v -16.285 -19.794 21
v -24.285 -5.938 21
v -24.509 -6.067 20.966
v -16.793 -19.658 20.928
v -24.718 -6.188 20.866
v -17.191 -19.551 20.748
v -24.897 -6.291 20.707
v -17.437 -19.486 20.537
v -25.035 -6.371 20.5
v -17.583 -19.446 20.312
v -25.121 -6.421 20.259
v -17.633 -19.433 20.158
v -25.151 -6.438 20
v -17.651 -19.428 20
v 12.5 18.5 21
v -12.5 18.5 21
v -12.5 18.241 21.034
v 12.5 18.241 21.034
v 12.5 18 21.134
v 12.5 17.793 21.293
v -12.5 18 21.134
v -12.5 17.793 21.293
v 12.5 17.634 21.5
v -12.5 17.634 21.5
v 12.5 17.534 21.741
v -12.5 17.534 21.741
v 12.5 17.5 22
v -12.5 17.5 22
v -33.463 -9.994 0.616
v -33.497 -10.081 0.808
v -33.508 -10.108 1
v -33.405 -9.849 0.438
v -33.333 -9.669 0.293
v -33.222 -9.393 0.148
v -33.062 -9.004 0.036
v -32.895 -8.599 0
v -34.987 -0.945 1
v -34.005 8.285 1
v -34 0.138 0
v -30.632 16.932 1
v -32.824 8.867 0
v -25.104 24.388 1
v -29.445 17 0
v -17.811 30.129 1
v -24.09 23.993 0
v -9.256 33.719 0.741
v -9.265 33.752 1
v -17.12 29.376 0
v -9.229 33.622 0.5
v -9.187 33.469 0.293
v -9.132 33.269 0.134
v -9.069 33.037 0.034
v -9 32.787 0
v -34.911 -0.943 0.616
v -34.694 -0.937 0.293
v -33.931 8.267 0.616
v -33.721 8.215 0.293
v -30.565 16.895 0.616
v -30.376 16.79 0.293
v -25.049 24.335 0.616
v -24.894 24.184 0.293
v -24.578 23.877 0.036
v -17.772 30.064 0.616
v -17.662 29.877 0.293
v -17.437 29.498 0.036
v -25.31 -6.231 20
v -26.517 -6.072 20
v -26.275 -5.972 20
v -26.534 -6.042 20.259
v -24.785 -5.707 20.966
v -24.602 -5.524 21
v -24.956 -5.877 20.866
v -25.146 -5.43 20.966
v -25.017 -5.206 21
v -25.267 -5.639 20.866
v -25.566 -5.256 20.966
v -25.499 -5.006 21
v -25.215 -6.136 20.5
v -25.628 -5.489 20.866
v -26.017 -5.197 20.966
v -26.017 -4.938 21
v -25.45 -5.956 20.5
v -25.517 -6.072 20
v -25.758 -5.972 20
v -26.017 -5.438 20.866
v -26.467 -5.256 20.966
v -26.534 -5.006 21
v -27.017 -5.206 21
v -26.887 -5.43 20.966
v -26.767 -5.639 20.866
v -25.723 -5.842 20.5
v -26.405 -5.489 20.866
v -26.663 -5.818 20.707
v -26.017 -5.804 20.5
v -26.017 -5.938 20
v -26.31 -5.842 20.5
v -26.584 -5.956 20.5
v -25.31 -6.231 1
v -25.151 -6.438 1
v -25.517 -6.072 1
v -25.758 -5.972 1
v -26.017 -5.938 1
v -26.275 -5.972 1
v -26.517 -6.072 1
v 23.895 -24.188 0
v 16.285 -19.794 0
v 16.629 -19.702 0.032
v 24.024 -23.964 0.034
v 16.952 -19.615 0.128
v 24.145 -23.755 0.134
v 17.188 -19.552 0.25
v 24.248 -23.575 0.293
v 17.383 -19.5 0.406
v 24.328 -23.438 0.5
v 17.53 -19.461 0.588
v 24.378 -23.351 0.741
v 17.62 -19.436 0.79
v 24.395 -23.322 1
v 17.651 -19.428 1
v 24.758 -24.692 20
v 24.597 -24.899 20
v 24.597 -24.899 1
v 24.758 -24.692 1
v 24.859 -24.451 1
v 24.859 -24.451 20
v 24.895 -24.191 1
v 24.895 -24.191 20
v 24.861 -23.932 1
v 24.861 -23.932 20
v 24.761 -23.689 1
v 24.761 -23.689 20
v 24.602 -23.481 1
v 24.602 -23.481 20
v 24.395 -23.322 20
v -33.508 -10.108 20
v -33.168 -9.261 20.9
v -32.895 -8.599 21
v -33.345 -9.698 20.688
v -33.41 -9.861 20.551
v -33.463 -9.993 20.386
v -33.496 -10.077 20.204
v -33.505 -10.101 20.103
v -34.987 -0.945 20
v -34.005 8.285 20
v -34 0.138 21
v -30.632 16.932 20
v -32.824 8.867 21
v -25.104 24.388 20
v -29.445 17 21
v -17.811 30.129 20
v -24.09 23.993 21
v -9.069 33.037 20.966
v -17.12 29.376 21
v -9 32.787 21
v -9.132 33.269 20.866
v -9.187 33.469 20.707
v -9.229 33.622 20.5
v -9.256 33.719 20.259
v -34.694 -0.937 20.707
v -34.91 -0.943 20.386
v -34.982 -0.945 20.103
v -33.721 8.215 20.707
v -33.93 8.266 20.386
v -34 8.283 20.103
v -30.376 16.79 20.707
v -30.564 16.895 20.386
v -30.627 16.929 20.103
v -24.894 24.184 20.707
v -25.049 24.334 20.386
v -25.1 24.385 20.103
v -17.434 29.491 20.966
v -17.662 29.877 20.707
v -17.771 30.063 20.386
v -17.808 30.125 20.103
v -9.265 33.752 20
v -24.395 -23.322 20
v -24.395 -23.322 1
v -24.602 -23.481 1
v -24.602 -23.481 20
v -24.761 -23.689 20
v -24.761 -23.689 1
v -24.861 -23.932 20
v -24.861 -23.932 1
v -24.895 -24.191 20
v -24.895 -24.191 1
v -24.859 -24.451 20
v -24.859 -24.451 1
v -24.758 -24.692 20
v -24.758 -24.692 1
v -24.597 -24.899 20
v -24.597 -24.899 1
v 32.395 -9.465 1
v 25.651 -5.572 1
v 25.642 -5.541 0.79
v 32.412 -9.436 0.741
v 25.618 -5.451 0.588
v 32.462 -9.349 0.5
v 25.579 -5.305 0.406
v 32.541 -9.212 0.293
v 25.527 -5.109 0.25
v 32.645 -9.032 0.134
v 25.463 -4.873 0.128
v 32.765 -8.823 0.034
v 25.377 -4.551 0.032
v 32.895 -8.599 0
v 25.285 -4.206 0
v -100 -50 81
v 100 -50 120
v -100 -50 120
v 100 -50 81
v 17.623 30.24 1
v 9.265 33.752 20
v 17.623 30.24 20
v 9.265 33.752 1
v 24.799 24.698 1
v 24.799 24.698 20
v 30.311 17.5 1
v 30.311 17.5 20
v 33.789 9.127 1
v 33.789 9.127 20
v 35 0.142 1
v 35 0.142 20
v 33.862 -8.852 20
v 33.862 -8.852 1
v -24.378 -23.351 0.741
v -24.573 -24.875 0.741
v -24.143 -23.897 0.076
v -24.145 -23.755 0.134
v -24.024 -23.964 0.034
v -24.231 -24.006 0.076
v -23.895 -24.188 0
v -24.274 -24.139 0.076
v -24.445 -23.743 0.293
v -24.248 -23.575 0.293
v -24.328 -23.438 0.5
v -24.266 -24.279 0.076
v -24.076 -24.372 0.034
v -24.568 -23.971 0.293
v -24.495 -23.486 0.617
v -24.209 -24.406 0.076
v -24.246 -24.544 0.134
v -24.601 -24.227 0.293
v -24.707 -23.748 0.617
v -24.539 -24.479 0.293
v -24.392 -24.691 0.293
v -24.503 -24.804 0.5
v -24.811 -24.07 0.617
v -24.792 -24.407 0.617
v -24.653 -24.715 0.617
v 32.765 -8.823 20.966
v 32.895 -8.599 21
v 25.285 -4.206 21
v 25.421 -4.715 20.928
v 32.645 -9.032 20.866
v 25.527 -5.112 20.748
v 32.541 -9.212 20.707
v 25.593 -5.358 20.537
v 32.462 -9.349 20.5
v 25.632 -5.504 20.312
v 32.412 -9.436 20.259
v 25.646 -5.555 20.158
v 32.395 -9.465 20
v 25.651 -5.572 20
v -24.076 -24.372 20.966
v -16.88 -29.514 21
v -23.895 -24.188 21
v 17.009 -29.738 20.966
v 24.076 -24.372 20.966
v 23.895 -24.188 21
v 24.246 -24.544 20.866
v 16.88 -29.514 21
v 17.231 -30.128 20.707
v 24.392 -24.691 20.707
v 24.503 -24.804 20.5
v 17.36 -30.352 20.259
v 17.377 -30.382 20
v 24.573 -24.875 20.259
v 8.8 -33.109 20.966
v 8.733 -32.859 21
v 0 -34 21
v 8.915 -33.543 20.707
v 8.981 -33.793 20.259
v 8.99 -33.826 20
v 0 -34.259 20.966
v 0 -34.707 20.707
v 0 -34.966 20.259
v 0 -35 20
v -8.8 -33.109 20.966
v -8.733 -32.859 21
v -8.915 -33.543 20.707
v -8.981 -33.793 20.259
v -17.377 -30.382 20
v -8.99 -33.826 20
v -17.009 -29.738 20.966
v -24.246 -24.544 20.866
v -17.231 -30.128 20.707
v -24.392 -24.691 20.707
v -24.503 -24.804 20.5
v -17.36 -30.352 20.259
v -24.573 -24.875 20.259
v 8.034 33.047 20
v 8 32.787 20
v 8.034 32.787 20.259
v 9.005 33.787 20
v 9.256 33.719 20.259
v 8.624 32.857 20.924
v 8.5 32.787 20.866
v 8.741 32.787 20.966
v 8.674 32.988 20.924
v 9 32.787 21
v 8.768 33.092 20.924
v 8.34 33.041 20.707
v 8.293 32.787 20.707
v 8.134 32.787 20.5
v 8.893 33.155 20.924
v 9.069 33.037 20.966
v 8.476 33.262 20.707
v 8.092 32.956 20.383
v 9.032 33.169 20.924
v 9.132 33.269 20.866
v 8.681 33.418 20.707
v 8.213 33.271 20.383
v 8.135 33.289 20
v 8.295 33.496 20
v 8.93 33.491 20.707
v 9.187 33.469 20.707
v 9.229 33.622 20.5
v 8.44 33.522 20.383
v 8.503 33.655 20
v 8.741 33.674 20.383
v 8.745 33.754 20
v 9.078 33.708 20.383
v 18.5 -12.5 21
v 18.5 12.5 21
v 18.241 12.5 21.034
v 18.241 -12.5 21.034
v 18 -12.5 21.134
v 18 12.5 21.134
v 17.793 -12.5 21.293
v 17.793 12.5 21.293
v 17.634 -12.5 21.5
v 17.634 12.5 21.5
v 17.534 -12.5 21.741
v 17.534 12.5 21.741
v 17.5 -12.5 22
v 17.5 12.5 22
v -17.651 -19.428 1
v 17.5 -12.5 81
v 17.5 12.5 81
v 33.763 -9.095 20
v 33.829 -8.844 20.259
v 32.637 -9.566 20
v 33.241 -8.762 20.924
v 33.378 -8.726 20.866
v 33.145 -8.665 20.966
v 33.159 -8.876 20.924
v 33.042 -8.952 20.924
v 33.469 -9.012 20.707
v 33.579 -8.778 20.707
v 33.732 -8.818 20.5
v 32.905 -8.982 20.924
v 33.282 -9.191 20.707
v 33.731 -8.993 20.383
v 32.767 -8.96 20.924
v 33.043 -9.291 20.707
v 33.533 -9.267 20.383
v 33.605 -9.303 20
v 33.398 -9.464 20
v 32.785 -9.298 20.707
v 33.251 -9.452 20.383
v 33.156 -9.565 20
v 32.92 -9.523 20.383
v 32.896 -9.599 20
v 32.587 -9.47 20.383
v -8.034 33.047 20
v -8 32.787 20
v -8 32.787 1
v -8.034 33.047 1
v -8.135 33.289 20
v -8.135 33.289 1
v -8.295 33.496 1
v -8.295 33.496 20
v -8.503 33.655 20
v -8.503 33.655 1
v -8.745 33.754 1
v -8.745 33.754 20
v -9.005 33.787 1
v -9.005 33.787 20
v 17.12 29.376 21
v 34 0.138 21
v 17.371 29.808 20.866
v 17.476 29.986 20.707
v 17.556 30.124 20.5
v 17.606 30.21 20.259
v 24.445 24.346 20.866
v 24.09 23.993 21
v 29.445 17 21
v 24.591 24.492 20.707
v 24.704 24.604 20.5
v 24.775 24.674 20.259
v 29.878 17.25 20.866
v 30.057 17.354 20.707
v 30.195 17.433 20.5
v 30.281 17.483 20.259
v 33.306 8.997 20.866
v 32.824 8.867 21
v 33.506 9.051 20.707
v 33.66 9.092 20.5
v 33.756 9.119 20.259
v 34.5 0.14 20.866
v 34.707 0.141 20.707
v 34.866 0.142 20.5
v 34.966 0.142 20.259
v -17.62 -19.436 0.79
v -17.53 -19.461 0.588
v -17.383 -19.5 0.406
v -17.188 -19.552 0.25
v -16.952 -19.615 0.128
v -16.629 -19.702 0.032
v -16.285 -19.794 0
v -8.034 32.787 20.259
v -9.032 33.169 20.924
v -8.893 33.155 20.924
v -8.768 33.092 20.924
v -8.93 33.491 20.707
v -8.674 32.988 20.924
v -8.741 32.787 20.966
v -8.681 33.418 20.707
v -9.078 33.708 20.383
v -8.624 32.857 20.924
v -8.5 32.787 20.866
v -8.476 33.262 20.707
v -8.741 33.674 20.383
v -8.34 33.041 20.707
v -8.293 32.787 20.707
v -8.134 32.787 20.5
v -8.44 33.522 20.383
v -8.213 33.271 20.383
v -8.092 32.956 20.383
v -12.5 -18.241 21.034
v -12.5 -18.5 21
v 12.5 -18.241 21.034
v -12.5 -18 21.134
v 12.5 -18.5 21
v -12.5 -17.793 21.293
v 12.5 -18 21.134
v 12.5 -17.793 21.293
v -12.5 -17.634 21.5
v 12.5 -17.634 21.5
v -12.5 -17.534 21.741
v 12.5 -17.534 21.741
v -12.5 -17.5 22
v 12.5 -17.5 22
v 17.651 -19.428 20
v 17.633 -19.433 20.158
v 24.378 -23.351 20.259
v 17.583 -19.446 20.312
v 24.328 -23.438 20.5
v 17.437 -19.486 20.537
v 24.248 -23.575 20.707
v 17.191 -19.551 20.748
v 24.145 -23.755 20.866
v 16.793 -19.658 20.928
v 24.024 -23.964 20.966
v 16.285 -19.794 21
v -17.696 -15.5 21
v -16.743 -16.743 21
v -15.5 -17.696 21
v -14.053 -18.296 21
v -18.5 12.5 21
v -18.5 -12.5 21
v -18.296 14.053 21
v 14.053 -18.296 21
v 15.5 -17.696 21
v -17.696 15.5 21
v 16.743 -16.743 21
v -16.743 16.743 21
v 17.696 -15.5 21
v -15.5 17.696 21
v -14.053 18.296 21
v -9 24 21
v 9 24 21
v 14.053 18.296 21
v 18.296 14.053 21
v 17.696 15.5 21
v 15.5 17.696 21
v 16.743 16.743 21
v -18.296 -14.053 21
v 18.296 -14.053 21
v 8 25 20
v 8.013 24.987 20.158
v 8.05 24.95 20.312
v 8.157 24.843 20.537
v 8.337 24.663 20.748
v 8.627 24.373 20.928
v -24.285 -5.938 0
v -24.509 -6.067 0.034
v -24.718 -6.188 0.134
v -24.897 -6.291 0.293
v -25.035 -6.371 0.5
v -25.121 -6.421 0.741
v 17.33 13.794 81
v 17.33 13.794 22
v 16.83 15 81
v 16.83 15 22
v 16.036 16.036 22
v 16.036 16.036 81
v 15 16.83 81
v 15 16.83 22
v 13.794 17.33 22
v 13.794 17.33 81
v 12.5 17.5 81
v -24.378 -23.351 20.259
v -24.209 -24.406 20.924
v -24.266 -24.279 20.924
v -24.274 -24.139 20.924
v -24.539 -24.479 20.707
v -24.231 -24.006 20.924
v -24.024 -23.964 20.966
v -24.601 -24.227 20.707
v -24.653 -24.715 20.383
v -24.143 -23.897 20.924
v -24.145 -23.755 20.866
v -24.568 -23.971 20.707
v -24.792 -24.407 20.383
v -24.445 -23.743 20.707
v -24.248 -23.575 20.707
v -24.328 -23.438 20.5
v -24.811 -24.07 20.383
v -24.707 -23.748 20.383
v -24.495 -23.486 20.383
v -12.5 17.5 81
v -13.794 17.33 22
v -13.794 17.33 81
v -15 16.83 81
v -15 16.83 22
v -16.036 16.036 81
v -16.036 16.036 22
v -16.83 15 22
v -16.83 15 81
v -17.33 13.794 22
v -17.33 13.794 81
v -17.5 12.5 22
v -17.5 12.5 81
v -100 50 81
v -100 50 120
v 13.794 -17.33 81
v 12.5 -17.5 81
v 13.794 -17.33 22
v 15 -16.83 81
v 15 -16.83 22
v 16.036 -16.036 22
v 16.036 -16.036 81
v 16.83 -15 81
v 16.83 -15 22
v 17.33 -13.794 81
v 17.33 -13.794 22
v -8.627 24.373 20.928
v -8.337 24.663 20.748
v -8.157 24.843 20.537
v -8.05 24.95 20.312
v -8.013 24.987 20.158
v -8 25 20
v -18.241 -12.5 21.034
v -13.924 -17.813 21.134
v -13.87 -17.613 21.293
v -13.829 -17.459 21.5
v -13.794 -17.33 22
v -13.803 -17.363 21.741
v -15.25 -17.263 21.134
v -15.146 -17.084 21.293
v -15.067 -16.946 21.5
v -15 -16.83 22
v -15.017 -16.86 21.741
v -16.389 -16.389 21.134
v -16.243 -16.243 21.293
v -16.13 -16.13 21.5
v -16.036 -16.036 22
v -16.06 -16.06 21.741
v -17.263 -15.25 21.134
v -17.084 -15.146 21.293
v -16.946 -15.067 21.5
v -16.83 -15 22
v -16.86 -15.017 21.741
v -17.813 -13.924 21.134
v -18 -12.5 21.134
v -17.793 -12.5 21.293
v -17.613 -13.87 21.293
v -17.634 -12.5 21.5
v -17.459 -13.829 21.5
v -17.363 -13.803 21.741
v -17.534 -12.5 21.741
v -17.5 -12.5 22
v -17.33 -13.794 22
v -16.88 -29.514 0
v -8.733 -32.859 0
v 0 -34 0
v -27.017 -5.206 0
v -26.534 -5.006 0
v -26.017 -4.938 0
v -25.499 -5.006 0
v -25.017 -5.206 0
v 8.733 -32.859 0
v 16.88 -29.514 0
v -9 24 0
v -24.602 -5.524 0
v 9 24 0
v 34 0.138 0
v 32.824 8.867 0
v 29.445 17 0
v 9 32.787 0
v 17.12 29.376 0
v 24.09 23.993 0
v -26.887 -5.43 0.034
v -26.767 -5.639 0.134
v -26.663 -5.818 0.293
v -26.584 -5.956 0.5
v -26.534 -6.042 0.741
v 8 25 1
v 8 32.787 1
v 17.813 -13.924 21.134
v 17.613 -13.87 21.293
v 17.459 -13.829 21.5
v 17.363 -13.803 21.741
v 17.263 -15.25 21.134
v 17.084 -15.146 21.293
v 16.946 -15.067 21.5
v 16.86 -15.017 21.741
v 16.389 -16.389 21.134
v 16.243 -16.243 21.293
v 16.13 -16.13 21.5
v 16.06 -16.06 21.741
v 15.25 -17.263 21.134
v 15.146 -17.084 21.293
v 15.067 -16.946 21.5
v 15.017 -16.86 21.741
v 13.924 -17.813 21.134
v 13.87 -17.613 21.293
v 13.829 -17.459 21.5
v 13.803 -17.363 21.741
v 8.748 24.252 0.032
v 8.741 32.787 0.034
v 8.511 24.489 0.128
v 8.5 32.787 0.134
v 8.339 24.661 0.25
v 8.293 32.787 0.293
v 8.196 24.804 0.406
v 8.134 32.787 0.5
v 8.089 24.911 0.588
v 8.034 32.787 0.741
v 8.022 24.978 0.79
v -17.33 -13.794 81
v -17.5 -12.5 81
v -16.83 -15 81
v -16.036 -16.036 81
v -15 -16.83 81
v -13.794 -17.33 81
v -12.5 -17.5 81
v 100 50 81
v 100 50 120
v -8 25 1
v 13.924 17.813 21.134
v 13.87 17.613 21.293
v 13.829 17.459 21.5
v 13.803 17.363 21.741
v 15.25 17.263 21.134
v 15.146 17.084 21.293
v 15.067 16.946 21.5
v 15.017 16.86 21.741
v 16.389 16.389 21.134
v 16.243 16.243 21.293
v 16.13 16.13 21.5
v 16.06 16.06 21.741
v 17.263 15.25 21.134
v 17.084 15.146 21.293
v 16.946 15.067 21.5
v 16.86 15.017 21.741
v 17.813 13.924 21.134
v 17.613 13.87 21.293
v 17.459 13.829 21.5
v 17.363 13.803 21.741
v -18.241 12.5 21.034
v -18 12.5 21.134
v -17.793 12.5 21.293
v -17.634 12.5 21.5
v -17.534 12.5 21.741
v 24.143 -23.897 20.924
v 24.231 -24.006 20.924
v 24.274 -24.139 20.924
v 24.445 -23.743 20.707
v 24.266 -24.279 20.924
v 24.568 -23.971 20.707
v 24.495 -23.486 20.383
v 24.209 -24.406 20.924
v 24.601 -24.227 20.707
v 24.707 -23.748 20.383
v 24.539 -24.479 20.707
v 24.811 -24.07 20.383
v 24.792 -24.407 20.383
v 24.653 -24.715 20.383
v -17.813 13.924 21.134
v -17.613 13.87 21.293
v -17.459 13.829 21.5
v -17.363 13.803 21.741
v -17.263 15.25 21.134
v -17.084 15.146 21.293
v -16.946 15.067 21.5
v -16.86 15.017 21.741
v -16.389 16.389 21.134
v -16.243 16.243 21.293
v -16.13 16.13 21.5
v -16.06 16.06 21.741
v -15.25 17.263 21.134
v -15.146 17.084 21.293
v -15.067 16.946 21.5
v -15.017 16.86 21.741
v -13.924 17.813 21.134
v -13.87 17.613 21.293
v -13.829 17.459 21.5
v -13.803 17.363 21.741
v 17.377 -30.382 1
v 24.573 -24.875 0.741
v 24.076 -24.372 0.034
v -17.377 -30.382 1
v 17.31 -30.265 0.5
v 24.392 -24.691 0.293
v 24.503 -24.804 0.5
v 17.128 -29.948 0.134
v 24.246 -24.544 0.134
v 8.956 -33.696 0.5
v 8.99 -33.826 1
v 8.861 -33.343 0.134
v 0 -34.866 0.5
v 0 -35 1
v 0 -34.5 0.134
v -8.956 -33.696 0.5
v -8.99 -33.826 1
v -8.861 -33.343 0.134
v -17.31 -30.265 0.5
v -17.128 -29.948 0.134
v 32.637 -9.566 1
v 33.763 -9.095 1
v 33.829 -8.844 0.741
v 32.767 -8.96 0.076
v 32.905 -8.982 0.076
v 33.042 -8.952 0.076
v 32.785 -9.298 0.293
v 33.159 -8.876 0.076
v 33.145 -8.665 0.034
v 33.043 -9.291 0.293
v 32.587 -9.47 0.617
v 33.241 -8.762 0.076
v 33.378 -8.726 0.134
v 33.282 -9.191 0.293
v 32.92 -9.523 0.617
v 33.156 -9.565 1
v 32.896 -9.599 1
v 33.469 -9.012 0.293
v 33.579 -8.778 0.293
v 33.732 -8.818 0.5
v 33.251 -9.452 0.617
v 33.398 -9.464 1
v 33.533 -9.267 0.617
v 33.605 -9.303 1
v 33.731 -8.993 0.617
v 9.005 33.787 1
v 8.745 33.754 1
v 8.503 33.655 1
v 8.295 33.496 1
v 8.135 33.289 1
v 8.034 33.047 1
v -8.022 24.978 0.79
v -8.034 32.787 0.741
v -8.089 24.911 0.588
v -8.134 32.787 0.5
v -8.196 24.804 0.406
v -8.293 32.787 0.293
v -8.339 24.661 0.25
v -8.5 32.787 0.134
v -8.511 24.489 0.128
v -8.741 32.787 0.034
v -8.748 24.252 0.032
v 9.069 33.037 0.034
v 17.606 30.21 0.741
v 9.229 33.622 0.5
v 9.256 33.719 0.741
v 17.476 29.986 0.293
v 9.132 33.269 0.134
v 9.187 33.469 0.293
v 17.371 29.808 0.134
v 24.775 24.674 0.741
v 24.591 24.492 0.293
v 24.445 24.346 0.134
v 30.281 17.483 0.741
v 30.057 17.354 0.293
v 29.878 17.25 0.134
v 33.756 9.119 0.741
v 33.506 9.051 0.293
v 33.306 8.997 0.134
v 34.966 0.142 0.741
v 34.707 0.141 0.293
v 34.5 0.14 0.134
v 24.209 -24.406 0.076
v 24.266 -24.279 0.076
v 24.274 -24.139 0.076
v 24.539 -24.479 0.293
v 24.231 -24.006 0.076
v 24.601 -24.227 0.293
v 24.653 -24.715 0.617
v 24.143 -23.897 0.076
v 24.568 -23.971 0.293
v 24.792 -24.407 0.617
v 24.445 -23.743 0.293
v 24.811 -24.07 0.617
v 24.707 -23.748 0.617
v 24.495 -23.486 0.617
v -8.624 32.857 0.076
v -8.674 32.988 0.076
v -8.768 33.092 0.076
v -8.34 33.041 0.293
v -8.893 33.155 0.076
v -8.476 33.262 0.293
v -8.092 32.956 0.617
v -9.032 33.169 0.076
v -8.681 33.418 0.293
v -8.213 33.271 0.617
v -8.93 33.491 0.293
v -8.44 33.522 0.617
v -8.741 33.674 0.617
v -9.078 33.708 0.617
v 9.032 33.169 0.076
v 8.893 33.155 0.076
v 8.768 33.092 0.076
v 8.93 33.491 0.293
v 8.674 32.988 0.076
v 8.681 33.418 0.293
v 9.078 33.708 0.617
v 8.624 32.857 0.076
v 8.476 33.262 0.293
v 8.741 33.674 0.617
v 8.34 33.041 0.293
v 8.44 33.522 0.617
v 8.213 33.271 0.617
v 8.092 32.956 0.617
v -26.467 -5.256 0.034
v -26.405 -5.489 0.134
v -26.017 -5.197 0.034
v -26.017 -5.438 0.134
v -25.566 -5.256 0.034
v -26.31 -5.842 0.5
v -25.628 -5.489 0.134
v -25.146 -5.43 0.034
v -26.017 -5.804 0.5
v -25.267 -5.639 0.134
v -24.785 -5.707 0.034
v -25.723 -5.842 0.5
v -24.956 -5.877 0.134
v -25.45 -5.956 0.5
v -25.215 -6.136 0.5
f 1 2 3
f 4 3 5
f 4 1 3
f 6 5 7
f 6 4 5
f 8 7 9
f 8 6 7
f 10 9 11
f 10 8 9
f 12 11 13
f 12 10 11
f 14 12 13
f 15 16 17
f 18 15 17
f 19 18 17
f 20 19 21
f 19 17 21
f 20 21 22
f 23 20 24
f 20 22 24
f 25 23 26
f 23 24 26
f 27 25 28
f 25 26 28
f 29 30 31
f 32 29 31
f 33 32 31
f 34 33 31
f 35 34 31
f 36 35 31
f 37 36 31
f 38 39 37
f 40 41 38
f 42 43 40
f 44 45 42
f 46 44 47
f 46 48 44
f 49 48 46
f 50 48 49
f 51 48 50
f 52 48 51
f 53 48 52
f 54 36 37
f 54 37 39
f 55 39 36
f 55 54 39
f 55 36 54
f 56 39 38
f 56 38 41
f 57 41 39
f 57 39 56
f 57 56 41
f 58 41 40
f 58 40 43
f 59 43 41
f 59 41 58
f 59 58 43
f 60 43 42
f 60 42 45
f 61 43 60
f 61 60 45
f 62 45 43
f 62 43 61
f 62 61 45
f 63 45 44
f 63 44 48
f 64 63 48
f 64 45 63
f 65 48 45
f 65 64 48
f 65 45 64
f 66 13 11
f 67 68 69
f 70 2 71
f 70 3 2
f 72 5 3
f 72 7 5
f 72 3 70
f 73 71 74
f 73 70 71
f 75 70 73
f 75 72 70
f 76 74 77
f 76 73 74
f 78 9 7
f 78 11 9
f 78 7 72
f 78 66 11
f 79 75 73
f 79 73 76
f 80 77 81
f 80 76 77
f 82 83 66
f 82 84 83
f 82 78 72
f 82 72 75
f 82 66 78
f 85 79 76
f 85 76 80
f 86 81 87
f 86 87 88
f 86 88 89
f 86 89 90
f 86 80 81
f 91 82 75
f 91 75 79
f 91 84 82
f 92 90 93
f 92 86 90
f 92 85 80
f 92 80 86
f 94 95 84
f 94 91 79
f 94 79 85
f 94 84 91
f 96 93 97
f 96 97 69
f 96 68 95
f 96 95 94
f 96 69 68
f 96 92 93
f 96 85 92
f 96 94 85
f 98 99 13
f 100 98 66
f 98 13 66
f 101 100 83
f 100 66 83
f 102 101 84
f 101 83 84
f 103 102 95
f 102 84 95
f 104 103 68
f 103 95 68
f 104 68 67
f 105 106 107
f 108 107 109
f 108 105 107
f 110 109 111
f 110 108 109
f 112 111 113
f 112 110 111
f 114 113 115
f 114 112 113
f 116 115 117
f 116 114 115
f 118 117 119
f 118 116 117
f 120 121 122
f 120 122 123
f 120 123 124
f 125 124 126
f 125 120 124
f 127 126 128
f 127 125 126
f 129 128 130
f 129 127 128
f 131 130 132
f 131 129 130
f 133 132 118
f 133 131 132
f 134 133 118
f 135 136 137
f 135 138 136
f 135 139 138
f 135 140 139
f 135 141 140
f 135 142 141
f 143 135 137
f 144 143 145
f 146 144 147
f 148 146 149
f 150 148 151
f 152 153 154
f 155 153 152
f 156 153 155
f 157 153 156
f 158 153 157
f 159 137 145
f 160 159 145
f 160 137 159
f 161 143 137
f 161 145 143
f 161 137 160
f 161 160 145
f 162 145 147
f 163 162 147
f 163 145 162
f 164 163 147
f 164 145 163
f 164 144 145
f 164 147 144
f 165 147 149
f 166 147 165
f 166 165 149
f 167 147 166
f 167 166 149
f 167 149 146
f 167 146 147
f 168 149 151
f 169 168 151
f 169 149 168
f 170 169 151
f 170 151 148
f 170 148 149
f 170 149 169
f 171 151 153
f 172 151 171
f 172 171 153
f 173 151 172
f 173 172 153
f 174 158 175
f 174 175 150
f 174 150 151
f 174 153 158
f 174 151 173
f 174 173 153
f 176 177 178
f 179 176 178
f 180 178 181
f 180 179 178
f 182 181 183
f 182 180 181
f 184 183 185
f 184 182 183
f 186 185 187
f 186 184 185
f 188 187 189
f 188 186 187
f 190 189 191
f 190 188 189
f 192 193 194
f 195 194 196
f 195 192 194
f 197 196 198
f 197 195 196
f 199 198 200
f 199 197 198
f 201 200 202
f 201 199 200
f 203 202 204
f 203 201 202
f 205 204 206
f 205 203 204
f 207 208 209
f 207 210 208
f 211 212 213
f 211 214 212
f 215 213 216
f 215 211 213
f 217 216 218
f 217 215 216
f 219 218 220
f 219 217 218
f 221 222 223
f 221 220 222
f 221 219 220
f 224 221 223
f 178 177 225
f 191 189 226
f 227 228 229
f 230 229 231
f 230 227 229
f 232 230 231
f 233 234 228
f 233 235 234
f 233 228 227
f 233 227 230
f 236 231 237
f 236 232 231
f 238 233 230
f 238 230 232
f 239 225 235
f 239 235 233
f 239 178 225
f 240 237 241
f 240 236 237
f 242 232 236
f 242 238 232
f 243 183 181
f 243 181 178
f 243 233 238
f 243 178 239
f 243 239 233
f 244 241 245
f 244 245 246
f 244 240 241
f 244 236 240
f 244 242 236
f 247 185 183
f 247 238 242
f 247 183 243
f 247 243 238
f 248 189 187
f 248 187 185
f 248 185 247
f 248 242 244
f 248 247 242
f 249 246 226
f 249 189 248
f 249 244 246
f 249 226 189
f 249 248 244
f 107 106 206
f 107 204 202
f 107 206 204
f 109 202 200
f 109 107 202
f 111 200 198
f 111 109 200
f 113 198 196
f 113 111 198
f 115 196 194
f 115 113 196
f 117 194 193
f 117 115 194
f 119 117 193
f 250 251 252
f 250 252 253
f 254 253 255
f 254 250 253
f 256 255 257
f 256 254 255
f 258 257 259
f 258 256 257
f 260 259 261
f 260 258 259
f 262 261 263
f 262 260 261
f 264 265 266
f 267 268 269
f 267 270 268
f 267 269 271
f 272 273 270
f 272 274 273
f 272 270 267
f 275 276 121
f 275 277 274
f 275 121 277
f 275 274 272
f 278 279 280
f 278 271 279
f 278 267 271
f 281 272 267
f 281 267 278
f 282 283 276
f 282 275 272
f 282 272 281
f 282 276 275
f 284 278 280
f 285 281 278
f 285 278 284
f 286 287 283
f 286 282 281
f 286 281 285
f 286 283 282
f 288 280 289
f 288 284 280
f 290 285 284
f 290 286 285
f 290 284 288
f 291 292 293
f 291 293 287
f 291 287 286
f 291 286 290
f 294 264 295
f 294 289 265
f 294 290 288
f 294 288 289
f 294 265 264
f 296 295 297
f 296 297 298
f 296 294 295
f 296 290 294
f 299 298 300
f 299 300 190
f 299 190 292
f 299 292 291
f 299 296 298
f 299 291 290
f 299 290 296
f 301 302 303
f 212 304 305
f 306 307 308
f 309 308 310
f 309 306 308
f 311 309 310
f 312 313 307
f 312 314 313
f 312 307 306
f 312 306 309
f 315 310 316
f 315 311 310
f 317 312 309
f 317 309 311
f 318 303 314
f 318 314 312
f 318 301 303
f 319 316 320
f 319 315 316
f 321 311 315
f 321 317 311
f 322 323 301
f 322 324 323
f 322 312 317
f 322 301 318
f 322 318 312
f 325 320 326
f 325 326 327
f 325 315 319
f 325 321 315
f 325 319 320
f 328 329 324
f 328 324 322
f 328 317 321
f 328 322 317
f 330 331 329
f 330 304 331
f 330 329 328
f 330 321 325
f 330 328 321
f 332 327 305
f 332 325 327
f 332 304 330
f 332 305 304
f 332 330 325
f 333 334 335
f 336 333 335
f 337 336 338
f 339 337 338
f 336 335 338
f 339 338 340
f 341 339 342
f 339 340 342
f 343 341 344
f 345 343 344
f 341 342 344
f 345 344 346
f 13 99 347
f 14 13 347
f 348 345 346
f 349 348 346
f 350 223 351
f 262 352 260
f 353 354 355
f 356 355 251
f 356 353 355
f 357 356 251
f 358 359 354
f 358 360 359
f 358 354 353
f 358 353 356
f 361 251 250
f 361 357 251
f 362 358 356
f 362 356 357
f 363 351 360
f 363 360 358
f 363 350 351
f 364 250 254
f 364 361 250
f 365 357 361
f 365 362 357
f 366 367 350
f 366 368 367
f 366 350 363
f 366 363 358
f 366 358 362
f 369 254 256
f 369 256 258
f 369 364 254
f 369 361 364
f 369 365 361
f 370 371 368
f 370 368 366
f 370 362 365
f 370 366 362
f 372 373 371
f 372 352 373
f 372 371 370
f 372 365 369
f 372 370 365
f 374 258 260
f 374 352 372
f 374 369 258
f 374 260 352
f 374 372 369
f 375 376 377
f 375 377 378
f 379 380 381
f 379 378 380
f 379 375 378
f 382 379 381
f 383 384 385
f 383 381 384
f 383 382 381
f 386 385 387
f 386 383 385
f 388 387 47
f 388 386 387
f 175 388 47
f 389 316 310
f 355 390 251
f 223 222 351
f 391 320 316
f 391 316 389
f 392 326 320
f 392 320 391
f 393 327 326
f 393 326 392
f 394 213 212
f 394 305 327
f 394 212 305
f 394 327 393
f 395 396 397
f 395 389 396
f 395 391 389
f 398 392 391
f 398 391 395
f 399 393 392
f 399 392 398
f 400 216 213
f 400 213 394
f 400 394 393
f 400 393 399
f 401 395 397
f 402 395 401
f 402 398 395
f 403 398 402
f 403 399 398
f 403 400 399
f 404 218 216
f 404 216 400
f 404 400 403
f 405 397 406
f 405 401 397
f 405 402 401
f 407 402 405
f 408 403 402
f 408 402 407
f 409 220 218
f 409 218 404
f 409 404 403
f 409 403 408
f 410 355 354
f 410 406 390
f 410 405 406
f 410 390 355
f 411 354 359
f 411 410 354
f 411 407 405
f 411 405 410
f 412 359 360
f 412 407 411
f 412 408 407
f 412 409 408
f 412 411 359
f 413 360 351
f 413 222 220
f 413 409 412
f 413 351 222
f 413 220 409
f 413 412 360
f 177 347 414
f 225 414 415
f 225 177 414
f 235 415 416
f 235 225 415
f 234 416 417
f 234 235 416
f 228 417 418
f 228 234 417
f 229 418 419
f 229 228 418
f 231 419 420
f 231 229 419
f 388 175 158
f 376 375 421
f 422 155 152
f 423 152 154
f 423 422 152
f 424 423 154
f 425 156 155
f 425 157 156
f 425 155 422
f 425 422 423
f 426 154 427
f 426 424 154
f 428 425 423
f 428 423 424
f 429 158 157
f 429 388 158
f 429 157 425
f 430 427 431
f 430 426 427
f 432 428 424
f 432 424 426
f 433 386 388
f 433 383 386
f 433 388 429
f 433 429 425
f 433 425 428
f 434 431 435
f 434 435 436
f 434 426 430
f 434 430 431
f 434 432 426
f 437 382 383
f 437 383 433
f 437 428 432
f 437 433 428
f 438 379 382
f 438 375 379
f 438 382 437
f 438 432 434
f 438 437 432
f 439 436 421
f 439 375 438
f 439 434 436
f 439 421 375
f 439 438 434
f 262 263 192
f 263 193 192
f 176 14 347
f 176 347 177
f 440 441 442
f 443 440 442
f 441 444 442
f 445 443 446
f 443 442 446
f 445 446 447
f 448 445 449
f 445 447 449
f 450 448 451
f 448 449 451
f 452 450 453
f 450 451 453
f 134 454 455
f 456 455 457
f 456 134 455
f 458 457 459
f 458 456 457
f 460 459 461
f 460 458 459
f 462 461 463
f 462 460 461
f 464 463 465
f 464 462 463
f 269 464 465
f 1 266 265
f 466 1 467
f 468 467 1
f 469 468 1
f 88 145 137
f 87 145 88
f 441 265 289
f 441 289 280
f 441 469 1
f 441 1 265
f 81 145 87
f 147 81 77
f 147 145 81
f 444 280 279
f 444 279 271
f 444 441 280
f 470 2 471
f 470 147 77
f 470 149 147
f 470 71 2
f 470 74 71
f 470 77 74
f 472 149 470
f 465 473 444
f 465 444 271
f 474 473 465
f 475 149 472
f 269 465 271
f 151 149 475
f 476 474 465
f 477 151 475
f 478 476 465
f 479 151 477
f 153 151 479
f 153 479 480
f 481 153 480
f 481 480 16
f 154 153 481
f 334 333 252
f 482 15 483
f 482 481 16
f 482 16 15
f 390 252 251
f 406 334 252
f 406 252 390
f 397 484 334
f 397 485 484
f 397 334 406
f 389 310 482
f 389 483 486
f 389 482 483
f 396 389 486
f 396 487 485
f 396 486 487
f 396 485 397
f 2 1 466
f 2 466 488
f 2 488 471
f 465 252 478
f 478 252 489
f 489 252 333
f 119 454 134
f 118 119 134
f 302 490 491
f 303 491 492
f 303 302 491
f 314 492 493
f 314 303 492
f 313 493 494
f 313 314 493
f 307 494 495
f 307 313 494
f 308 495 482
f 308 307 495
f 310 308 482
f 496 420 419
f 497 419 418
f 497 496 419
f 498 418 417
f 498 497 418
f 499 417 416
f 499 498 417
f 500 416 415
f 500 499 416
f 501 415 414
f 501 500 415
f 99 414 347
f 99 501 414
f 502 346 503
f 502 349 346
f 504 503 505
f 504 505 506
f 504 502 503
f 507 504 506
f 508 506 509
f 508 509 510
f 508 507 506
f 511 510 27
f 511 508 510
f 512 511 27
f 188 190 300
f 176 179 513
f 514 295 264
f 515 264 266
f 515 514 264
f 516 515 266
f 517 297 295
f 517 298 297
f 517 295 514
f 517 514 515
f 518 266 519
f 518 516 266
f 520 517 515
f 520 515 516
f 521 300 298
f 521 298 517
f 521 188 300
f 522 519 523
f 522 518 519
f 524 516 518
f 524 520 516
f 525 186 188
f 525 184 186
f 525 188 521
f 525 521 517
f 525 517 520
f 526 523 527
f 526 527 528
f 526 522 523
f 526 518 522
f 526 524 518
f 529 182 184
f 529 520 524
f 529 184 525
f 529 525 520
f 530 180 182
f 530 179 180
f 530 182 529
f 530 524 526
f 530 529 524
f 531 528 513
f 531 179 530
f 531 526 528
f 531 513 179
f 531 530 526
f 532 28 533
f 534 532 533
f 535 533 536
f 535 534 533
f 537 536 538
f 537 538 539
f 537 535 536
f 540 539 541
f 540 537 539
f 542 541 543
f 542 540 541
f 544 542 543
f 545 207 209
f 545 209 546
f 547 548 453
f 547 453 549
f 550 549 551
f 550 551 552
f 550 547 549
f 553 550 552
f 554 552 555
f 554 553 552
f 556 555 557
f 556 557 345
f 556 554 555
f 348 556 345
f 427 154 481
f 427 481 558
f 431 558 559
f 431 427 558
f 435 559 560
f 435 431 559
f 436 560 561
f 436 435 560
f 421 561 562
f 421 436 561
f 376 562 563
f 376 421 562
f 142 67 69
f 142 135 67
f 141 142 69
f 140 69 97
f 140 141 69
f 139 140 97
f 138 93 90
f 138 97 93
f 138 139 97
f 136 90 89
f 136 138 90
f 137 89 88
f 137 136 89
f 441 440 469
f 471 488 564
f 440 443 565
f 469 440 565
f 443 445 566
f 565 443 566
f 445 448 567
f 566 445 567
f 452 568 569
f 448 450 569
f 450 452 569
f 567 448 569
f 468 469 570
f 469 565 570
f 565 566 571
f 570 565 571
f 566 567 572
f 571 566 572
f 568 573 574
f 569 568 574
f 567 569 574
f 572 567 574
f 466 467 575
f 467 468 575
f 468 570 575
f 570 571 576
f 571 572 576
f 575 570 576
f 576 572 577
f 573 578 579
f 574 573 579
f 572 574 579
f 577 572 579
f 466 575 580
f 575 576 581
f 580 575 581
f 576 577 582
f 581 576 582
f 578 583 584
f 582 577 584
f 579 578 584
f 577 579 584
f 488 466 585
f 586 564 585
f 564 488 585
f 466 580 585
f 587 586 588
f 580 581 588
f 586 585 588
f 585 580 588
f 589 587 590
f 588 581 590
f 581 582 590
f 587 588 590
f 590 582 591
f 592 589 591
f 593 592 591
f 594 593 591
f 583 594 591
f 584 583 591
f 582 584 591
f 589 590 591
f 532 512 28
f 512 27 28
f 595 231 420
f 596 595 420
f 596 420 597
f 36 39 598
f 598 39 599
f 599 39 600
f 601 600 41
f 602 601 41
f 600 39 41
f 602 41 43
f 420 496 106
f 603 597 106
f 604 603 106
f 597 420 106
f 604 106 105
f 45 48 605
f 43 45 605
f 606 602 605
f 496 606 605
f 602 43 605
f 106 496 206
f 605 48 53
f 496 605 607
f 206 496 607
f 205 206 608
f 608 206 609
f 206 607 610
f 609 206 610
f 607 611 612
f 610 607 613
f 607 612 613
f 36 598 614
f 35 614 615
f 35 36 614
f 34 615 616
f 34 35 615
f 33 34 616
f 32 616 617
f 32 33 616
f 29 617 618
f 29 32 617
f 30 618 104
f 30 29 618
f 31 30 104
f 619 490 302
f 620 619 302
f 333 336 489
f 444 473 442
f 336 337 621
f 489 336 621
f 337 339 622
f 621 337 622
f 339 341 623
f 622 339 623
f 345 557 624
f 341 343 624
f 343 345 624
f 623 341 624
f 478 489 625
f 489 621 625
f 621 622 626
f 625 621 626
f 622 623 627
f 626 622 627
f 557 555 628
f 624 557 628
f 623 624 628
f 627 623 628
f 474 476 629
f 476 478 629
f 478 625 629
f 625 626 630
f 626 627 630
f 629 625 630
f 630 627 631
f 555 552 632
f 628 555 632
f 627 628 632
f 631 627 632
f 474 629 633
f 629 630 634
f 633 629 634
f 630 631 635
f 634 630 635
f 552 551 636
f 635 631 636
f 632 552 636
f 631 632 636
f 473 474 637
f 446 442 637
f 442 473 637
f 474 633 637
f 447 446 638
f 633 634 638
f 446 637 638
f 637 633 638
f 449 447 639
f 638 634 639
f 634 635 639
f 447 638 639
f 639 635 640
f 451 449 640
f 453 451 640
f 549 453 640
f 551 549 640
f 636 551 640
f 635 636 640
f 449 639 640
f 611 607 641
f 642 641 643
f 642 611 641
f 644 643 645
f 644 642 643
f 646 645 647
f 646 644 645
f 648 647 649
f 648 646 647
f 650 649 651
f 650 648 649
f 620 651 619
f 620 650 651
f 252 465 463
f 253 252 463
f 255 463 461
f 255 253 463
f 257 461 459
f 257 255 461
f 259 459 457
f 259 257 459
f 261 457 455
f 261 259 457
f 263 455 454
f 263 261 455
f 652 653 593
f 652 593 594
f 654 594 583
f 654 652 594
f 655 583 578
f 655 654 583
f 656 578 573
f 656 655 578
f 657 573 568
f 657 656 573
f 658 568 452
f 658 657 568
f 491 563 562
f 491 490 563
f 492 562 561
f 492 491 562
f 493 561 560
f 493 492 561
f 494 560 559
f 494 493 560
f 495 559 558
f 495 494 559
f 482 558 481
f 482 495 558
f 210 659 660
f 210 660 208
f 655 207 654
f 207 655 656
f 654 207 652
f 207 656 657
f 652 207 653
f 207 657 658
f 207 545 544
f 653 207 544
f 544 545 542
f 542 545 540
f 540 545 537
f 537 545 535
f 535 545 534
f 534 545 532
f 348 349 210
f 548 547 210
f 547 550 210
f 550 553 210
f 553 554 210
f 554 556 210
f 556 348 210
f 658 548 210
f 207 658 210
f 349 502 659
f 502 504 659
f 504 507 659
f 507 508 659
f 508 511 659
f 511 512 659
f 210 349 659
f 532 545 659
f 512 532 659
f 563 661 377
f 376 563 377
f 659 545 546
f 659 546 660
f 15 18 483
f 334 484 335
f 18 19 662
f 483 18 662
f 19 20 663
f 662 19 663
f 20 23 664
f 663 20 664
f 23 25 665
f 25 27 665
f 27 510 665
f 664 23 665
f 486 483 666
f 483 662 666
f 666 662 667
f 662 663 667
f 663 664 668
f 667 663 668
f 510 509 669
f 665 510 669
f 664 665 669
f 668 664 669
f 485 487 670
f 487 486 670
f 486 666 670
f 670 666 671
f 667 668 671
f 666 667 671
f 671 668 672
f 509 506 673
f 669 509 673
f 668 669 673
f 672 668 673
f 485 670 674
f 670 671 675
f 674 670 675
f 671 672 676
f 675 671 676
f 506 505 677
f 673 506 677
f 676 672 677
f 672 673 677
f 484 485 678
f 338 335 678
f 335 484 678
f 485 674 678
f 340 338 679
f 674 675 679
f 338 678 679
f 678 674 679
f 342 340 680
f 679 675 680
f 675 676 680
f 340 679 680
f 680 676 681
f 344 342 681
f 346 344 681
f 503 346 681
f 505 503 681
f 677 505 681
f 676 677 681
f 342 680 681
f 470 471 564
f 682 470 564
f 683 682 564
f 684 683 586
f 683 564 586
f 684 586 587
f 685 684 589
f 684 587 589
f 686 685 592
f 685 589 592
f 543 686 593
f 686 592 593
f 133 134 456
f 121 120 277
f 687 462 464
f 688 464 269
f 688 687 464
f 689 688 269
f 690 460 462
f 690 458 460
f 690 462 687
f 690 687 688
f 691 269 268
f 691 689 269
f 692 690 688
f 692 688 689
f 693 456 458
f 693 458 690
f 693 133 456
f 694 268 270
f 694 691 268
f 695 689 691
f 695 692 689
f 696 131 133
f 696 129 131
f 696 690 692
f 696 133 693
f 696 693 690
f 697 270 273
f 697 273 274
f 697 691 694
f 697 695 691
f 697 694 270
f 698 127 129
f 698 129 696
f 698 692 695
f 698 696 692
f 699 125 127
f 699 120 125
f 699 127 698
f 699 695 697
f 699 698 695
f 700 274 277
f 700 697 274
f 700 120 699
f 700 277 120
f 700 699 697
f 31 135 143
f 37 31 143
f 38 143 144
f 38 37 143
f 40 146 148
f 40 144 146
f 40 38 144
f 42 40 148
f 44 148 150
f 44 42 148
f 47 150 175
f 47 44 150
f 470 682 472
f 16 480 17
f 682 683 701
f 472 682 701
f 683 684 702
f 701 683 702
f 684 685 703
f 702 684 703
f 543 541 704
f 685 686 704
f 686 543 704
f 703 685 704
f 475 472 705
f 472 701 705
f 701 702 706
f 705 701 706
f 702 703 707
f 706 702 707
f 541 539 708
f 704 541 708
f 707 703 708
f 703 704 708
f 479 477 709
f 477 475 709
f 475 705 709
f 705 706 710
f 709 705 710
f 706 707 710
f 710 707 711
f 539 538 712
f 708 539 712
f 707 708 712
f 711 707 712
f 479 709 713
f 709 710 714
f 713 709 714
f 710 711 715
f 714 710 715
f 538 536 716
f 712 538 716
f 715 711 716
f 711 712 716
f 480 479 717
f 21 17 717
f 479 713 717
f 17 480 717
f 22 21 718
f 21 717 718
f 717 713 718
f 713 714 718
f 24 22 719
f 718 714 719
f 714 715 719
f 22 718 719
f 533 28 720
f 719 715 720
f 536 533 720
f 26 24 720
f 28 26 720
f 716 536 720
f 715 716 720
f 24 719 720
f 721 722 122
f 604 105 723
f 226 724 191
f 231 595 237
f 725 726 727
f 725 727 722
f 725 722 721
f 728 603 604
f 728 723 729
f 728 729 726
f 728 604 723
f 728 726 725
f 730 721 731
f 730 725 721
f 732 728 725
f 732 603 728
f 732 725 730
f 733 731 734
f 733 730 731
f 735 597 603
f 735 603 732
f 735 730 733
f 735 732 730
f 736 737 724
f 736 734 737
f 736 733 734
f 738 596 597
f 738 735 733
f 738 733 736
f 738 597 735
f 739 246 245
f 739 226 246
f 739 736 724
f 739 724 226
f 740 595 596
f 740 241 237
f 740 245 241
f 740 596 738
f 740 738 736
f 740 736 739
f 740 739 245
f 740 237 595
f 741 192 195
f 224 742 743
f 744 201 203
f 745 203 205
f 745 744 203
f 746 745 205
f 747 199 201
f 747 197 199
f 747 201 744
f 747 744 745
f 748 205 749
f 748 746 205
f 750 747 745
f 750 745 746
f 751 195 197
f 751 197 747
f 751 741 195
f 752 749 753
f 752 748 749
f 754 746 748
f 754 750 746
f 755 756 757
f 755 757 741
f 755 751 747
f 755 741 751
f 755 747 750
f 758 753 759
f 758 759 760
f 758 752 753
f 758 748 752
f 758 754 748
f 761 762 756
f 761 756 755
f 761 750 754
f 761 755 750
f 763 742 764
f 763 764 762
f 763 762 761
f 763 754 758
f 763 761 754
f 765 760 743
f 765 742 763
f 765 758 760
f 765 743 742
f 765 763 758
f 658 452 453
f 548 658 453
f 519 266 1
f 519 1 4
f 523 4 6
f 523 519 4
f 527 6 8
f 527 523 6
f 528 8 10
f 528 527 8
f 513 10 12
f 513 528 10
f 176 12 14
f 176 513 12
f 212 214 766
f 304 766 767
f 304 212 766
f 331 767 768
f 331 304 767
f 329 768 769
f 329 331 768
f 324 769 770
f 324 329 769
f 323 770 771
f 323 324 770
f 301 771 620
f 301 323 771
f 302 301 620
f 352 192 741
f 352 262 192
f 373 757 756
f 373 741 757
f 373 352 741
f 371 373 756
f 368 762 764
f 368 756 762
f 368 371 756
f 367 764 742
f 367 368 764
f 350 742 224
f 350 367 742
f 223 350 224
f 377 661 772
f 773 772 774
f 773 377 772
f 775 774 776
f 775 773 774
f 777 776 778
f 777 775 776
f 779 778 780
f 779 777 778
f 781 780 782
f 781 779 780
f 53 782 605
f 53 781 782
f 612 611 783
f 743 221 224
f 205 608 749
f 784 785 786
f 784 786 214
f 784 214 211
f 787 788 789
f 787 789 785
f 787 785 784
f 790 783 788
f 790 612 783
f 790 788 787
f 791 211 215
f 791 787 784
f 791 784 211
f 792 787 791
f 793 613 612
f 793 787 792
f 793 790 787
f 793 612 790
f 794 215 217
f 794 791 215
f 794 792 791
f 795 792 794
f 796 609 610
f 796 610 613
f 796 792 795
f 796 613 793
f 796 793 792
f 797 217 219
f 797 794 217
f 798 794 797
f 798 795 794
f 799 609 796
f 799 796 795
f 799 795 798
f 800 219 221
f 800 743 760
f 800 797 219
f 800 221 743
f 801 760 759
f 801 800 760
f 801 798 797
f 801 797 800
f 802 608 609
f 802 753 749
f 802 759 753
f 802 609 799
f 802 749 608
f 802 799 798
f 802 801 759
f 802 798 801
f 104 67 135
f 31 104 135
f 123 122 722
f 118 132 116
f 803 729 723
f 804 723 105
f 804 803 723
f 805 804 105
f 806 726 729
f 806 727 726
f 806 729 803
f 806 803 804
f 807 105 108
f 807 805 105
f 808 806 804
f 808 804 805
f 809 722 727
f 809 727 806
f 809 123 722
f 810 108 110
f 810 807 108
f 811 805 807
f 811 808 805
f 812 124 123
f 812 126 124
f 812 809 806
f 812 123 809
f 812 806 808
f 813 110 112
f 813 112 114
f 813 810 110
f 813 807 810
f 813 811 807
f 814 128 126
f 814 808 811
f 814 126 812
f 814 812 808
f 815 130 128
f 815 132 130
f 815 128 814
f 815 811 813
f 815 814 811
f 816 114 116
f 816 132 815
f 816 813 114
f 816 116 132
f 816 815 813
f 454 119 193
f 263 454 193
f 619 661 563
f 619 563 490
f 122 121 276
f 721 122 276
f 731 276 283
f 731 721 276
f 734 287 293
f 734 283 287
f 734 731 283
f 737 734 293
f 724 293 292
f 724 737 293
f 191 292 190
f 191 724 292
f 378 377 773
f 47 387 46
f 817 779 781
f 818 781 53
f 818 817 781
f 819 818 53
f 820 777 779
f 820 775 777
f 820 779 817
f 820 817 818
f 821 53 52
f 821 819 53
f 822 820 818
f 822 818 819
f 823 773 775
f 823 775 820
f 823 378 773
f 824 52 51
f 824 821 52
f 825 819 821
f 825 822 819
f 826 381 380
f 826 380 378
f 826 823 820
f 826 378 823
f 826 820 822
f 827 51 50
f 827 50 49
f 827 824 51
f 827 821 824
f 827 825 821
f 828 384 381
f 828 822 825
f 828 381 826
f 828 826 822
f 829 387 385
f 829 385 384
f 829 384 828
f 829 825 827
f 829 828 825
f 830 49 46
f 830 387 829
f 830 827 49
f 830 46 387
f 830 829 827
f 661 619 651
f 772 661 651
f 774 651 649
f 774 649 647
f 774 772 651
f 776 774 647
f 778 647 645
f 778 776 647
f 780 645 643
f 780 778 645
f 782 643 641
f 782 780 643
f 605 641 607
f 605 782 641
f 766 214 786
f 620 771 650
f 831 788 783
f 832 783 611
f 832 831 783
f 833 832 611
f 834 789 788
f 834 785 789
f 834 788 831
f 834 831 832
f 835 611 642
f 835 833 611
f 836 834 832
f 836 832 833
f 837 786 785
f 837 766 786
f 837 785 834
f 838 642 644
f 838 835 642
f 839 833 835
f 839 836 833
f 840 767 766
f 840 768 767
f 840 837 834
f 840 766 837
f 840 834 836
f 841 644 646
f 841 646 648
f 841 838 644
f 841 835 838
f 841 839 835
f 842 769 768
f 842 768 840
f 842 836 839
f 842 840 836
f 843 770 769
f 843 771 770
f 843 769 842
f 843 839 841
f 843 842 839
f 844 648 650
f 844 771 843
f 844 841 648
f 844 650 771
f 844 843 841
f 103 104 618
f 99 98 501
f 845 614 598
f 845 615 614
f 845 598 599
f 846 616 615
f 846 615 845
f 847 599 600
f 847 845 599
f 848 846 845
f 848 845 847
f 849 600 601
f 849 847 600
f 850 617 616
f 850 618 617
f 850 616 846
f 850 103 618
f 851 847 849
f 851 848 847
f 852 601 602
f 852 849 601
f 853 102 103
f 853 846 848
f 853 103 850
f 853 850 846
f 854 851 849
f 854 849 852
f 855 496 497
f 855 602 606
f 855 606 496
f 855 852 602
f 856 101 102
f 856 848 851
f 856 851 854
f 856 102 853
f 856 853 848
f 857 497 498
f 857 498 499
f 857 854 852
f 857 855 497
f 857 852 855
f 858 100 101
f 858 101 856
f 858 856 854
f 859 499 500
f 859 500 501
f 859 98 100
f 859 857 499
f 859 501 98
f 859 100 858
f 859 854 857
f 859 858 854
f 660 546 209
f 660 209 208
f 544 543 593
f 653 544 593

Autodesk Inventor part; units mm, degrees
ref_plane "YZ Plane" through (0, 0, 0) normal (1, 0, 0) x (0, 1, 0)
ref_plane "XZ Plane" through (0, 0, 0) normal (0, 1, 0) x (-1, 0, 0)
ref_plane "XY Plane" through (0, 0, 0) normal (0, 0, 1) x (1, 0, 0)
sketch "Sketch1" plane through (0, 0, 0) normal (0, 0, 1) x (1, 0, 0)
  circle A0 centre (0, 0) radius 25 construction
  line L0 (0, 0) -> (0, 25) construction
  line L1 (0, 0) -> (21.6506, -12.5) construction
  line L2 (0, 0) -> (-21.6506, -12.5) construction
  line L3 (0, 25) -> (8, 25)
  line L4 (0, 25) -> (-8, 25)
  line L5 (0, 25) -> (8, 25) construction
  line L6 (21.6506, -12.5) -> (25.6506, -5.5718)
  line L7 (21.6506, -12.5) -> (29.6506, -12.5) construction
  line L8 (21.6506, -12.5) -> (17.6506, -19.4282)
  line L9 (21.6506, -12.5) -> (29.6506, -12.5) construction
  line L10 (-21.6506, -12.5) -> (-25.6506, -5.5718)
  line L11 (-21.6506, -12.5) -> (-13.6506, -12.5) construction
  line L12 (-21.6506, -12.5) -> (-17.6506, -19.4282)
  line L13 (-21.6506, -12.5) -> (-13.6506, -12.5) construction
  line L14 (8, 25) -> (8, 34.0735)
  line L15 (-8, 25) -> (-8, 34.0735)
  line L16 (25.6506, -5.5718) -> (33.5085, -10.1085)
  line L17 (17.6506, -19.4282) -> (25.5085, -23.9649)
  line L18 (-17.6506, -19.4282) -> (-25.5085, -23.9649)
  line L19 (-25.6506, -5.5718) -> (-33.5085, -10.1085)
  arc A1 (33.5085, -10.1085) -> (8, 34.0735) centre (0, 0) ccw
  arc A2 (-8, 34.0735) -> (-33.5085, -10.1085) centre (0, 0) ccw
  arc A3 (-25.5085, -23.9649) -> (25.5085, -23.9649) centre (0, 0) ccw
  dimension "d0" = 50
  dimension "d1" = 120
  dimension "d2" = 120
  dimension "d3" = 8
  dimension "d4" = 8
  dimension "d5" = 180
  dimension "d6" = 8
  dimension "d7" = 60
  dimension "d8" = 8
  dimension "d9" = 120
  dimension "d10" = 8
  dimension "d11" = 120
  dimension "d12" = 8
  dimension "d13" = 60
  dimension "d15" = 35
  dimension "d16" = 35
  dimension "d17" = 35
extrude "Extrusion1" add sketch "Sketch1" along normal blind 21
sketch "Sketch2" plane through (0, 0, 21) normal (0, 0, 1) x (1, 0, 0)
  line L0 (-17.5, -17.5) -> (17.5, -17.5)
  line L1 (17.5, -17.5) -> (17.5, 17.5)
  line L2 (17.5, 17.5) -> (-17.5, 17.5)
  line L3 (-17.5, 17.5) -> (-17.5, -17.5)
  line L4 (-17.5, -17.5) -> (17.5, 17.5) construction
  line L5 (17.5, -17.5) -> (-17.5, 17.5) construction
  point P0 (0, 0)
  dimension "d20" = 35
  dimension "d21" = 35
extrude "Extrusion2" add sketch "Sketch2" along normal blind 60
fillet "Fillet1" radius 5 4 edges at (17.5, 17.5, 51) (17.5, -17.5, 51) (-17.5, 17.5, 51) (-17.5, -17.5, 51)
fillet "Fillet2" radius 1 38 edges at (30.3109, 17.5, 0) (-30.3109, 17.5, 0) (0, -35, 0) (21.6506, -12.5, 0) (29.5796, -7.8402, 0) (21.5796, -21.6966, 0) (8, 29.5367, 0) (0, 25, 0) (-8, 29.5367, 0) (-29.5796, -7.8402, 0) (-21.6506, -12.5, 0) (-21.5796, -21.6966, 0) (16.0355, 16.0355, 21) (17.5, 0, 21) (16.0355, -16.0355, 21) (0, -17.5, 21) (-16.0355, -16.0355, 21) (-17.5, 0, 21) (-16.0355, 16.0355, 21) (0, 17.5, 21) (-30.3109, 17.5, 21) (-8, 29.5367, 21) (0, 25, 21) (8, 29.5367, 21) (30.3109, 17.5, 21) (29.5796, -7.8402, 21) (21.6506, -12.5, 21) (21.5796, -21.6966, 21) (0, -35, 21) (-21.5796, -21.6966, 21) (-21.6506, -12.5, 21) (-29.5796, -7.8402, 21) (-8, 34.0735, 10.5) (8, 34.0735, 10.5) (33.5085, -10.1085, 10.5) (25.5085, -23.9649, 10.5) (-25.5085, -23.9649, 10.5) (-25.6506, -5.5718, 10.5)
sketch "Sketch4" plane through (0, 0, 81) normal (0, 0, 1) x (1, 0, 0)
  line L0 (-100, 50) -> (100, 50)
  line L1 (100, 50) -> (100, -50)
  line L2 (100, -50) -> (-100, -50)
  line L3 (-100, -50) -> (-100, 50)
  line L4 (-100, 50) -> (100, -50) construction
  line L5 (100, 50) -> (-100, -50) construction
  point P0 (0, 0)
  dimension "d29" = 200
  dimension "d30" = 100
extrude "Extrusion4" add sketch "Sketch4" along normal blind 39
equation "\"d3\" = d4"
equation "\"d6\" = d4"
equation "\"d8\" = d4"
equation "\"d10\" = d4"
equation "\"d12\" = d4"
equation "\"d16\" = d15"
equation "\"d17\" = d15"
properties part number "Sponge"
